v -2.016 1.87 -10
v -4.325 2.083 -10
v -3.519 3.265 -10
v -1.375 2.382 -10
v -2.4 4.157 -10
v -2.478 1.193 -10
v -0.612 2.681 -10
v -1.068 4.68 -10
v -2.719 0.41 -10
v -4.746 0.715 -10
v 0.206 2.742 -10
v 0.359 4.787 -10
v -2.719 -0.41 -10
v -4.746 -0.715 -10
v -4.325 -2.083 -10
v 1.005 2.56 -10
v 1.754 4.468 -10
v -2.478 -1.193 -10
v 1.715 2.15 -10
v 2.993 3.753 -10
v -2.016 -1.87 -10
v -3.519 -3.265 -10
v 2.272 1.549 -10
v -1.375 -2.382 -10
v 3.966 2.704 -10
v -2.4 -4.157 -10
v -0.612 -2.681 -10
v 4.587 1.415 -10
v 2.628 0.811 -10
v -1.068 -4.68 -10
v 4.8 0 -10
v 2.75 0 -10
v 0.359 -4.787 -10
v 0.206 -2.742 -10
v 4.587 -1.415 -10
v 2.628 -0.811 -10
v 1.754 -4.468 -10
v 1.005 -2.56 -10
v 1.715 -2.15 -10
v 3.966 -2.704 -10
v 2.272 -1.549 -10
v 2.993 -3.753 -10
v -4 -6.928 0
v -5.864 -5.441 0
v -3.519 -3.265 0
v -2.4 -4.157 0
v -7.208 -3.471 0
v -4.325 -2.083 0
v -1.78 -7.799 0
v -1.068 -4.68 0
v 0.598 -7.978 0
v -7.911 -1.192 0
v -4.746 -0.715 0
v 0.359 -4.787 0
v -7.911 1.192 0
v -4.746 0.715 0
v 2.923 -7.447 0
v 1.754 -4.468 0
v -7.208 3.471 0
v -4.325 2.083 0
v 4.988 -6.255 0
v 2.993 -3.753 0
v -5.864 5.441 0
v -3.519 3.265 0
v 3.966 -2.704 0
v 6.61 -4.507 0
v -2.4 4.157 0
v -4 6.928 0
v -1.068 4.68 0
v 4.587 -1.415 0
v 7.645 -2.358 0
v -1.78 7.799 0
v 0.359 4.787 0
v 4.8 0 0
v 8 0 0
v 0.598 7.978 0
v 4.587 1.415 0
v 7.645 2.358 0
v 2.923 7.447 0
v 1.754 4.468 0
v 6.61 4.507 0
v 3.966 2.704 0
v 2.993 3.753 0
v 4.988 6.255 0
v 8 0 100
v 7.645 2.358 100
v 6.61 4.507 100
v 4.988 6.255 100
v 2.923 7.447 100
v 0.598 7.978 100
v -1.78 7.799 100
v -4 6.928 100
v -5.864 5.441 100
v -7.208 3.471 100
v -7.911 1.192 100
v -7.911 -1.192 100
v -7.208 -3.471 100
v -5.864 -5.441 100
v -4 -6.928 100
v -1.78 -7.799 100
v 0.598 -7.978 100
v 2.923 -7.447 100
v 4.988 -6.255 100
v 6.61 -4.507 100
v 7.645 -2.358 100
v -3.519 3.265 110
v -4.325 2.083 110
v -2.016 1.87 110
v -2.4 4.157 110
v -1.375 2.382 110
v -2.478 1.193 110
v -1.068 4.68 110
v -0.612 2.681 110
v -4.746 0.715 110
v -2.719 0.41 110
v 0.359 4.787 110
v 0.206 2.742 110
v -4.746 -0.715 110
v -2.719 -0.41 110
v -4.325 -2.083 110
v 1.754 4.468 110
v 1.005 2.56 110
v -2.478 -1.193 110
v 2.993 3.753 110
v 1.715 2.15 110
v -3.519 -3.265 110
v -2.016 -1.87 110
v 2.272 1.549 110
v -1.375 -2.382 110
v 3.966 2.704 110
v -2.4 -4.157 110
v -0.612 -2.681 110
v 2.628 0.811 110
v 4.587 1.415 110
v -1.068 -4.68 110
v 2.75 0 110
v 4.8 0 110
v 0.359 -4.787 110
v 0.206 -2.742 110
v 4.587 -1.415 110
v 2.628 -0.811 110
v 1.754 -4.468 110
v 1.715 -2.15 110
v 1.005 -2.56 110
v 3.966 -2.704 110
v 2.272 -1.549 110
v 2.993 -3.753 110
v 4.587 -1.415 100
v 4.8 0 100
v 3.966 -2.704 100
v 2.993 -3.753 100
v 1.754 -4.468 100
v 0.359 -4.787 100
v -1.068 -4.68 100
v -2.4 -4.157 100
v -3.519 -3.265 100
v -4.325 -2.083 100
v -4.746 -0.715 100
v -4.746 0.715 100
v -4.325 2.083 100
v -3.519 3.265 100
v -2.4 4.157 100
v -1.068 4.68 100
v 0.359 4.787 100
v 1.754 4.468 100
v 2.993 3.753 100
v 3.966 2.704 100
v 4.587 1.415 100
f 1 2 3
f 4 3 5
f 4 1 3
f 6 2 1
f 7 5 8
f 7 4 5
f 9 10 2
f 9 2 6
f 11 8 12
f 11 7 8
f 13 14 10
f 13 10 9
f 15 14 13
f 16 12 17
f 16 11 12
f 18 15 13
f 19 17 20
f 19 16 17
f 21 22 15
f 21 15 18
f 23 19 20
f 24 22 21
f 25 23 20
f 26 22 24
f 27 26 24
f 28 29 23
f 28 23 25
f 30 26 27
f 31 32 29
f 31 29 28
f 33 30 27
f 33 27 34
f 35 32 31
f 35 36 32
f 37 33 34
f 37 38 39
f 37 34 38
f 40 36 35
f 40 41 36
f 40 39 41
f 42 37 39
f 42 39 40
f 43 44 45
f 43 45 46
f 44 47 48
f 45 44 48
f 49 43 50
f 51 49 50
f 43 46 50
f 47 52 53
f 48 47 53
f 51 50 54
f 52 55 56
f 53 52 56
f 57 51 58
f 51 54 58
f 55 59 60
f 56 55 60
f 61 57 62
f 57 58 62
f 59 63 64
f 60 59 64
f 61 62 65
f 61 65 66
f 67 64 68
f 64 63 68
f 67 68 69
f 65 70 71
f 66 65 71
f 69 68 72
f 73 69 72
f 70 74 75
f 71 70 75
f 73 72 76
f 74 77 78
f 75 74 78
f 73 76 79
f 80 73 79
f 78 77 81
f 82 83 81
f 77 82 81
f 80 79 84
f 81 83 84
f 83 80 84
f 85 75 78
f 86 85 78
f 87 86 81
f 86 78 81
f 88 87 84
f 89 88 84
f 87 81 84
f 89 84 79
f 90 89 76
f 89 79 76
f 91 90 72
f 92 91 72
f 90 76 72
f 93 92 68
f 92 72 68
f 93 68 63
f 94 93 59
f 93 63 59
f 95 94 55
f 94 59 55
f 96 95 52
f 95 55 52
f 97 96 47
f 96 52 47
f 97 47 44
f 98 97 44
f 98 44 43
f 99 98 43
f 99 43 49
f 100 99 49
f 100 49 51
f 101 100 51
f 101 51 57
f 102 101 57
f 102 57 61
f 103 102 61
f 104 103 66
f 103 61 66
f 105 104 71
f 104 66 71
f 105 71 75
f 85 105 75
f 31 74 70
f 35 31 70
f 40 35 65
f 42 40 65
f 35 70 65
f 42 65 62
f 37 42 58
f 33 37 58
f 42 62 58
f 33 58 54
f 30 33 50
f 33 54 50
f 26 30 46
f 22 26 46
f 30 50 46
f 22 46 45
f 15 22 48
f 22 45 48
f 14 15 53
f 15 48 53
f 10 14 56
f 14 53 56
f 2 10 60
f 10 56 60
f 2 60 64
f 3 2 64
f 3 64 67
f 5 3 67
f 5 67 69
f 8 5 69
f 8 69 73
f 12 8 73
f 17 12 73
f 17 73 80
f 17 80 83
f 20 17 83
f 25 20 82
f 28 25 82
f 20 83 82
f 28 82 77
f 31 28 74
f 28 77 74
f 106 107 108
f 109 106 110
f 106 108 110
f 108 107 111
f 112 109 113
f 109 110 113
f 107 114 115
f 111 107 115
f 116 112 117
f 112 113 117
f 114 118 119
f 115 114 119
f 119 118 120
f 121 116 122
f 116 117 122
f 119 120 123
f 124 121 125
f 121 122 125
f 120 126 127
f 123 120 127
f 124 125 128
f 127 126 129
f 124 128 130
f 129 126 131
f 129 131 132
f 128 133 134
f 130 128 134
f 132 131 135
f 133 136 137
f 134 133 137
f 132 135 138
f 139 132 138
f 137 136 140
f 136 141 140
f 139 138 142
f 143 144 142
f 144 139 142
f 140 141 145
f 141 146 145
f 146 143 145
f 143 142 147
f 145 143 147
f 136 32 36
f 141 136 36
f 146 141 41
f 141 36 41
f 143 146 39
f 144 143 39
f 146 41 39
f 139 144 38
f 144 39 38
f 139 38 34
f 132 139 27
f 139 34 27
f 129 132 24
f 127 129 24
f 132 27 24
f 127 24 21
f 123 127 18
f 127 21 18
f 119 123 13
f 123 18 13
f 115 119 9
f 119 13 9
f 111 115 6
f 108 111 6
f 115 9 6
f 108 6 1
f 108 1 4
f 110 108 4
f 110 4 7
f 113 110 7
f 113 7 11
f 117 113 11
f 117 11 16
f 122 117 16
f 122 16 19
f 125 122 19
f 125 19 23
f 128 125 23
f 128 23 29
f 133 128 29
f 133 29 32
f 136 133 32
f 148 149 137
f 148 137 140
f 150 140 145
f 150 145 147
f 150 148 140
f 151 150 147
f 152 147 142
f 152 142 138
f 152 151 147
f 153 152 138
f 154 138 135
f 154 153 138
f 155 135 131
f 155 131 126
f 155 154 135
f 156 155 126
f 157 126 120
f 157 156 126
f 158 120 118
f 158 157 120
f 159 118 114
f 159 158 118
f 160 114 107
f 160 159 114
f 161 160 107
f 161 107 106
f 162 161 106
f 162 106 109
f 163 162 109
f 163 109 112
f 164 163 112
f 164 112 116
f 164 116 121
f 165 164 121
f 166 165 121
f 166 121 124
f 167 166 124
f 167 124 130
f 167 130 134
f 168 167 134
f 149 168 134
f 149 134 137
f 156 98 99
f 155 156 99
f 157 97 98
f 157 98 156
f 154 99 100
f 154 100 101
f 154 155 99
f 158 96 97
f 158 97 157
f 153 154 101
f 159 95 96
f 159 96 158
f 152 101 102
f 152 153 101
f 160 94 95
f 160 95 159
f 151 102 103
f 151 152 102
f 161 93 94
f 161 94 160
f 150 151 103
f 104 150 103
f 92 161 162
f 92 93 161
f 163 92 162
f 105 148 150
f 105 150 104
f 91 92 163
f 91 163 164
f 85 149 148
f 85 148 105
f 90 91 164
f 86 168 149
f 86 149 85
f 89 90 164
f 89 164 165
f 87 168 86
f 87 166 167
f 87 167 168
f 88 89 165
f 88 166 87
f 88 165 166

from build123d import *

# Parameters (mm, degrees)
SKETCH_R          = 8
PAD_DEPTH         = 100
SKETCH001_R       = 4.8
PAD001_DEPTH      = 10
PAD001_DEPTH_BACK = 110
SKETCH002_R       = 2.75
POCKET_DEPTH      = 120.001


with BuildPart() as part:
    # Sketch → Pad (new body)
    with BuildSketch(Plane.XY):
        Circle(SKETCH_R)
    extrude(amount=PAD_DEPTH)

    # Sketch001 → Pad001 (new body, two sides)
    with BuildSketch(Plane(origin=(0, 0, 0), x_dir=(1, 0, 0), z_dir=(0, 0, -1))) as pad001_sk:
        Circle(SKETCH001_R)
    extrude(amount=PAD001_DEPTH)
    extrude(pad001_sk.sketch, amount=-PAD001_DEPTH_BACK)

    # Sketch002 → Pocket (cut, through all)
    with BuildSketch(Plane(origin=(0, 0, -10), x_dir=(1, 0, 0), z_dir=(0, 0, -1))):
        Circle(SKETCH002_R)
    extrude(amount=-POCKET_DEPTH, mode=Mode.SUBTRACT)


solid = part.part
